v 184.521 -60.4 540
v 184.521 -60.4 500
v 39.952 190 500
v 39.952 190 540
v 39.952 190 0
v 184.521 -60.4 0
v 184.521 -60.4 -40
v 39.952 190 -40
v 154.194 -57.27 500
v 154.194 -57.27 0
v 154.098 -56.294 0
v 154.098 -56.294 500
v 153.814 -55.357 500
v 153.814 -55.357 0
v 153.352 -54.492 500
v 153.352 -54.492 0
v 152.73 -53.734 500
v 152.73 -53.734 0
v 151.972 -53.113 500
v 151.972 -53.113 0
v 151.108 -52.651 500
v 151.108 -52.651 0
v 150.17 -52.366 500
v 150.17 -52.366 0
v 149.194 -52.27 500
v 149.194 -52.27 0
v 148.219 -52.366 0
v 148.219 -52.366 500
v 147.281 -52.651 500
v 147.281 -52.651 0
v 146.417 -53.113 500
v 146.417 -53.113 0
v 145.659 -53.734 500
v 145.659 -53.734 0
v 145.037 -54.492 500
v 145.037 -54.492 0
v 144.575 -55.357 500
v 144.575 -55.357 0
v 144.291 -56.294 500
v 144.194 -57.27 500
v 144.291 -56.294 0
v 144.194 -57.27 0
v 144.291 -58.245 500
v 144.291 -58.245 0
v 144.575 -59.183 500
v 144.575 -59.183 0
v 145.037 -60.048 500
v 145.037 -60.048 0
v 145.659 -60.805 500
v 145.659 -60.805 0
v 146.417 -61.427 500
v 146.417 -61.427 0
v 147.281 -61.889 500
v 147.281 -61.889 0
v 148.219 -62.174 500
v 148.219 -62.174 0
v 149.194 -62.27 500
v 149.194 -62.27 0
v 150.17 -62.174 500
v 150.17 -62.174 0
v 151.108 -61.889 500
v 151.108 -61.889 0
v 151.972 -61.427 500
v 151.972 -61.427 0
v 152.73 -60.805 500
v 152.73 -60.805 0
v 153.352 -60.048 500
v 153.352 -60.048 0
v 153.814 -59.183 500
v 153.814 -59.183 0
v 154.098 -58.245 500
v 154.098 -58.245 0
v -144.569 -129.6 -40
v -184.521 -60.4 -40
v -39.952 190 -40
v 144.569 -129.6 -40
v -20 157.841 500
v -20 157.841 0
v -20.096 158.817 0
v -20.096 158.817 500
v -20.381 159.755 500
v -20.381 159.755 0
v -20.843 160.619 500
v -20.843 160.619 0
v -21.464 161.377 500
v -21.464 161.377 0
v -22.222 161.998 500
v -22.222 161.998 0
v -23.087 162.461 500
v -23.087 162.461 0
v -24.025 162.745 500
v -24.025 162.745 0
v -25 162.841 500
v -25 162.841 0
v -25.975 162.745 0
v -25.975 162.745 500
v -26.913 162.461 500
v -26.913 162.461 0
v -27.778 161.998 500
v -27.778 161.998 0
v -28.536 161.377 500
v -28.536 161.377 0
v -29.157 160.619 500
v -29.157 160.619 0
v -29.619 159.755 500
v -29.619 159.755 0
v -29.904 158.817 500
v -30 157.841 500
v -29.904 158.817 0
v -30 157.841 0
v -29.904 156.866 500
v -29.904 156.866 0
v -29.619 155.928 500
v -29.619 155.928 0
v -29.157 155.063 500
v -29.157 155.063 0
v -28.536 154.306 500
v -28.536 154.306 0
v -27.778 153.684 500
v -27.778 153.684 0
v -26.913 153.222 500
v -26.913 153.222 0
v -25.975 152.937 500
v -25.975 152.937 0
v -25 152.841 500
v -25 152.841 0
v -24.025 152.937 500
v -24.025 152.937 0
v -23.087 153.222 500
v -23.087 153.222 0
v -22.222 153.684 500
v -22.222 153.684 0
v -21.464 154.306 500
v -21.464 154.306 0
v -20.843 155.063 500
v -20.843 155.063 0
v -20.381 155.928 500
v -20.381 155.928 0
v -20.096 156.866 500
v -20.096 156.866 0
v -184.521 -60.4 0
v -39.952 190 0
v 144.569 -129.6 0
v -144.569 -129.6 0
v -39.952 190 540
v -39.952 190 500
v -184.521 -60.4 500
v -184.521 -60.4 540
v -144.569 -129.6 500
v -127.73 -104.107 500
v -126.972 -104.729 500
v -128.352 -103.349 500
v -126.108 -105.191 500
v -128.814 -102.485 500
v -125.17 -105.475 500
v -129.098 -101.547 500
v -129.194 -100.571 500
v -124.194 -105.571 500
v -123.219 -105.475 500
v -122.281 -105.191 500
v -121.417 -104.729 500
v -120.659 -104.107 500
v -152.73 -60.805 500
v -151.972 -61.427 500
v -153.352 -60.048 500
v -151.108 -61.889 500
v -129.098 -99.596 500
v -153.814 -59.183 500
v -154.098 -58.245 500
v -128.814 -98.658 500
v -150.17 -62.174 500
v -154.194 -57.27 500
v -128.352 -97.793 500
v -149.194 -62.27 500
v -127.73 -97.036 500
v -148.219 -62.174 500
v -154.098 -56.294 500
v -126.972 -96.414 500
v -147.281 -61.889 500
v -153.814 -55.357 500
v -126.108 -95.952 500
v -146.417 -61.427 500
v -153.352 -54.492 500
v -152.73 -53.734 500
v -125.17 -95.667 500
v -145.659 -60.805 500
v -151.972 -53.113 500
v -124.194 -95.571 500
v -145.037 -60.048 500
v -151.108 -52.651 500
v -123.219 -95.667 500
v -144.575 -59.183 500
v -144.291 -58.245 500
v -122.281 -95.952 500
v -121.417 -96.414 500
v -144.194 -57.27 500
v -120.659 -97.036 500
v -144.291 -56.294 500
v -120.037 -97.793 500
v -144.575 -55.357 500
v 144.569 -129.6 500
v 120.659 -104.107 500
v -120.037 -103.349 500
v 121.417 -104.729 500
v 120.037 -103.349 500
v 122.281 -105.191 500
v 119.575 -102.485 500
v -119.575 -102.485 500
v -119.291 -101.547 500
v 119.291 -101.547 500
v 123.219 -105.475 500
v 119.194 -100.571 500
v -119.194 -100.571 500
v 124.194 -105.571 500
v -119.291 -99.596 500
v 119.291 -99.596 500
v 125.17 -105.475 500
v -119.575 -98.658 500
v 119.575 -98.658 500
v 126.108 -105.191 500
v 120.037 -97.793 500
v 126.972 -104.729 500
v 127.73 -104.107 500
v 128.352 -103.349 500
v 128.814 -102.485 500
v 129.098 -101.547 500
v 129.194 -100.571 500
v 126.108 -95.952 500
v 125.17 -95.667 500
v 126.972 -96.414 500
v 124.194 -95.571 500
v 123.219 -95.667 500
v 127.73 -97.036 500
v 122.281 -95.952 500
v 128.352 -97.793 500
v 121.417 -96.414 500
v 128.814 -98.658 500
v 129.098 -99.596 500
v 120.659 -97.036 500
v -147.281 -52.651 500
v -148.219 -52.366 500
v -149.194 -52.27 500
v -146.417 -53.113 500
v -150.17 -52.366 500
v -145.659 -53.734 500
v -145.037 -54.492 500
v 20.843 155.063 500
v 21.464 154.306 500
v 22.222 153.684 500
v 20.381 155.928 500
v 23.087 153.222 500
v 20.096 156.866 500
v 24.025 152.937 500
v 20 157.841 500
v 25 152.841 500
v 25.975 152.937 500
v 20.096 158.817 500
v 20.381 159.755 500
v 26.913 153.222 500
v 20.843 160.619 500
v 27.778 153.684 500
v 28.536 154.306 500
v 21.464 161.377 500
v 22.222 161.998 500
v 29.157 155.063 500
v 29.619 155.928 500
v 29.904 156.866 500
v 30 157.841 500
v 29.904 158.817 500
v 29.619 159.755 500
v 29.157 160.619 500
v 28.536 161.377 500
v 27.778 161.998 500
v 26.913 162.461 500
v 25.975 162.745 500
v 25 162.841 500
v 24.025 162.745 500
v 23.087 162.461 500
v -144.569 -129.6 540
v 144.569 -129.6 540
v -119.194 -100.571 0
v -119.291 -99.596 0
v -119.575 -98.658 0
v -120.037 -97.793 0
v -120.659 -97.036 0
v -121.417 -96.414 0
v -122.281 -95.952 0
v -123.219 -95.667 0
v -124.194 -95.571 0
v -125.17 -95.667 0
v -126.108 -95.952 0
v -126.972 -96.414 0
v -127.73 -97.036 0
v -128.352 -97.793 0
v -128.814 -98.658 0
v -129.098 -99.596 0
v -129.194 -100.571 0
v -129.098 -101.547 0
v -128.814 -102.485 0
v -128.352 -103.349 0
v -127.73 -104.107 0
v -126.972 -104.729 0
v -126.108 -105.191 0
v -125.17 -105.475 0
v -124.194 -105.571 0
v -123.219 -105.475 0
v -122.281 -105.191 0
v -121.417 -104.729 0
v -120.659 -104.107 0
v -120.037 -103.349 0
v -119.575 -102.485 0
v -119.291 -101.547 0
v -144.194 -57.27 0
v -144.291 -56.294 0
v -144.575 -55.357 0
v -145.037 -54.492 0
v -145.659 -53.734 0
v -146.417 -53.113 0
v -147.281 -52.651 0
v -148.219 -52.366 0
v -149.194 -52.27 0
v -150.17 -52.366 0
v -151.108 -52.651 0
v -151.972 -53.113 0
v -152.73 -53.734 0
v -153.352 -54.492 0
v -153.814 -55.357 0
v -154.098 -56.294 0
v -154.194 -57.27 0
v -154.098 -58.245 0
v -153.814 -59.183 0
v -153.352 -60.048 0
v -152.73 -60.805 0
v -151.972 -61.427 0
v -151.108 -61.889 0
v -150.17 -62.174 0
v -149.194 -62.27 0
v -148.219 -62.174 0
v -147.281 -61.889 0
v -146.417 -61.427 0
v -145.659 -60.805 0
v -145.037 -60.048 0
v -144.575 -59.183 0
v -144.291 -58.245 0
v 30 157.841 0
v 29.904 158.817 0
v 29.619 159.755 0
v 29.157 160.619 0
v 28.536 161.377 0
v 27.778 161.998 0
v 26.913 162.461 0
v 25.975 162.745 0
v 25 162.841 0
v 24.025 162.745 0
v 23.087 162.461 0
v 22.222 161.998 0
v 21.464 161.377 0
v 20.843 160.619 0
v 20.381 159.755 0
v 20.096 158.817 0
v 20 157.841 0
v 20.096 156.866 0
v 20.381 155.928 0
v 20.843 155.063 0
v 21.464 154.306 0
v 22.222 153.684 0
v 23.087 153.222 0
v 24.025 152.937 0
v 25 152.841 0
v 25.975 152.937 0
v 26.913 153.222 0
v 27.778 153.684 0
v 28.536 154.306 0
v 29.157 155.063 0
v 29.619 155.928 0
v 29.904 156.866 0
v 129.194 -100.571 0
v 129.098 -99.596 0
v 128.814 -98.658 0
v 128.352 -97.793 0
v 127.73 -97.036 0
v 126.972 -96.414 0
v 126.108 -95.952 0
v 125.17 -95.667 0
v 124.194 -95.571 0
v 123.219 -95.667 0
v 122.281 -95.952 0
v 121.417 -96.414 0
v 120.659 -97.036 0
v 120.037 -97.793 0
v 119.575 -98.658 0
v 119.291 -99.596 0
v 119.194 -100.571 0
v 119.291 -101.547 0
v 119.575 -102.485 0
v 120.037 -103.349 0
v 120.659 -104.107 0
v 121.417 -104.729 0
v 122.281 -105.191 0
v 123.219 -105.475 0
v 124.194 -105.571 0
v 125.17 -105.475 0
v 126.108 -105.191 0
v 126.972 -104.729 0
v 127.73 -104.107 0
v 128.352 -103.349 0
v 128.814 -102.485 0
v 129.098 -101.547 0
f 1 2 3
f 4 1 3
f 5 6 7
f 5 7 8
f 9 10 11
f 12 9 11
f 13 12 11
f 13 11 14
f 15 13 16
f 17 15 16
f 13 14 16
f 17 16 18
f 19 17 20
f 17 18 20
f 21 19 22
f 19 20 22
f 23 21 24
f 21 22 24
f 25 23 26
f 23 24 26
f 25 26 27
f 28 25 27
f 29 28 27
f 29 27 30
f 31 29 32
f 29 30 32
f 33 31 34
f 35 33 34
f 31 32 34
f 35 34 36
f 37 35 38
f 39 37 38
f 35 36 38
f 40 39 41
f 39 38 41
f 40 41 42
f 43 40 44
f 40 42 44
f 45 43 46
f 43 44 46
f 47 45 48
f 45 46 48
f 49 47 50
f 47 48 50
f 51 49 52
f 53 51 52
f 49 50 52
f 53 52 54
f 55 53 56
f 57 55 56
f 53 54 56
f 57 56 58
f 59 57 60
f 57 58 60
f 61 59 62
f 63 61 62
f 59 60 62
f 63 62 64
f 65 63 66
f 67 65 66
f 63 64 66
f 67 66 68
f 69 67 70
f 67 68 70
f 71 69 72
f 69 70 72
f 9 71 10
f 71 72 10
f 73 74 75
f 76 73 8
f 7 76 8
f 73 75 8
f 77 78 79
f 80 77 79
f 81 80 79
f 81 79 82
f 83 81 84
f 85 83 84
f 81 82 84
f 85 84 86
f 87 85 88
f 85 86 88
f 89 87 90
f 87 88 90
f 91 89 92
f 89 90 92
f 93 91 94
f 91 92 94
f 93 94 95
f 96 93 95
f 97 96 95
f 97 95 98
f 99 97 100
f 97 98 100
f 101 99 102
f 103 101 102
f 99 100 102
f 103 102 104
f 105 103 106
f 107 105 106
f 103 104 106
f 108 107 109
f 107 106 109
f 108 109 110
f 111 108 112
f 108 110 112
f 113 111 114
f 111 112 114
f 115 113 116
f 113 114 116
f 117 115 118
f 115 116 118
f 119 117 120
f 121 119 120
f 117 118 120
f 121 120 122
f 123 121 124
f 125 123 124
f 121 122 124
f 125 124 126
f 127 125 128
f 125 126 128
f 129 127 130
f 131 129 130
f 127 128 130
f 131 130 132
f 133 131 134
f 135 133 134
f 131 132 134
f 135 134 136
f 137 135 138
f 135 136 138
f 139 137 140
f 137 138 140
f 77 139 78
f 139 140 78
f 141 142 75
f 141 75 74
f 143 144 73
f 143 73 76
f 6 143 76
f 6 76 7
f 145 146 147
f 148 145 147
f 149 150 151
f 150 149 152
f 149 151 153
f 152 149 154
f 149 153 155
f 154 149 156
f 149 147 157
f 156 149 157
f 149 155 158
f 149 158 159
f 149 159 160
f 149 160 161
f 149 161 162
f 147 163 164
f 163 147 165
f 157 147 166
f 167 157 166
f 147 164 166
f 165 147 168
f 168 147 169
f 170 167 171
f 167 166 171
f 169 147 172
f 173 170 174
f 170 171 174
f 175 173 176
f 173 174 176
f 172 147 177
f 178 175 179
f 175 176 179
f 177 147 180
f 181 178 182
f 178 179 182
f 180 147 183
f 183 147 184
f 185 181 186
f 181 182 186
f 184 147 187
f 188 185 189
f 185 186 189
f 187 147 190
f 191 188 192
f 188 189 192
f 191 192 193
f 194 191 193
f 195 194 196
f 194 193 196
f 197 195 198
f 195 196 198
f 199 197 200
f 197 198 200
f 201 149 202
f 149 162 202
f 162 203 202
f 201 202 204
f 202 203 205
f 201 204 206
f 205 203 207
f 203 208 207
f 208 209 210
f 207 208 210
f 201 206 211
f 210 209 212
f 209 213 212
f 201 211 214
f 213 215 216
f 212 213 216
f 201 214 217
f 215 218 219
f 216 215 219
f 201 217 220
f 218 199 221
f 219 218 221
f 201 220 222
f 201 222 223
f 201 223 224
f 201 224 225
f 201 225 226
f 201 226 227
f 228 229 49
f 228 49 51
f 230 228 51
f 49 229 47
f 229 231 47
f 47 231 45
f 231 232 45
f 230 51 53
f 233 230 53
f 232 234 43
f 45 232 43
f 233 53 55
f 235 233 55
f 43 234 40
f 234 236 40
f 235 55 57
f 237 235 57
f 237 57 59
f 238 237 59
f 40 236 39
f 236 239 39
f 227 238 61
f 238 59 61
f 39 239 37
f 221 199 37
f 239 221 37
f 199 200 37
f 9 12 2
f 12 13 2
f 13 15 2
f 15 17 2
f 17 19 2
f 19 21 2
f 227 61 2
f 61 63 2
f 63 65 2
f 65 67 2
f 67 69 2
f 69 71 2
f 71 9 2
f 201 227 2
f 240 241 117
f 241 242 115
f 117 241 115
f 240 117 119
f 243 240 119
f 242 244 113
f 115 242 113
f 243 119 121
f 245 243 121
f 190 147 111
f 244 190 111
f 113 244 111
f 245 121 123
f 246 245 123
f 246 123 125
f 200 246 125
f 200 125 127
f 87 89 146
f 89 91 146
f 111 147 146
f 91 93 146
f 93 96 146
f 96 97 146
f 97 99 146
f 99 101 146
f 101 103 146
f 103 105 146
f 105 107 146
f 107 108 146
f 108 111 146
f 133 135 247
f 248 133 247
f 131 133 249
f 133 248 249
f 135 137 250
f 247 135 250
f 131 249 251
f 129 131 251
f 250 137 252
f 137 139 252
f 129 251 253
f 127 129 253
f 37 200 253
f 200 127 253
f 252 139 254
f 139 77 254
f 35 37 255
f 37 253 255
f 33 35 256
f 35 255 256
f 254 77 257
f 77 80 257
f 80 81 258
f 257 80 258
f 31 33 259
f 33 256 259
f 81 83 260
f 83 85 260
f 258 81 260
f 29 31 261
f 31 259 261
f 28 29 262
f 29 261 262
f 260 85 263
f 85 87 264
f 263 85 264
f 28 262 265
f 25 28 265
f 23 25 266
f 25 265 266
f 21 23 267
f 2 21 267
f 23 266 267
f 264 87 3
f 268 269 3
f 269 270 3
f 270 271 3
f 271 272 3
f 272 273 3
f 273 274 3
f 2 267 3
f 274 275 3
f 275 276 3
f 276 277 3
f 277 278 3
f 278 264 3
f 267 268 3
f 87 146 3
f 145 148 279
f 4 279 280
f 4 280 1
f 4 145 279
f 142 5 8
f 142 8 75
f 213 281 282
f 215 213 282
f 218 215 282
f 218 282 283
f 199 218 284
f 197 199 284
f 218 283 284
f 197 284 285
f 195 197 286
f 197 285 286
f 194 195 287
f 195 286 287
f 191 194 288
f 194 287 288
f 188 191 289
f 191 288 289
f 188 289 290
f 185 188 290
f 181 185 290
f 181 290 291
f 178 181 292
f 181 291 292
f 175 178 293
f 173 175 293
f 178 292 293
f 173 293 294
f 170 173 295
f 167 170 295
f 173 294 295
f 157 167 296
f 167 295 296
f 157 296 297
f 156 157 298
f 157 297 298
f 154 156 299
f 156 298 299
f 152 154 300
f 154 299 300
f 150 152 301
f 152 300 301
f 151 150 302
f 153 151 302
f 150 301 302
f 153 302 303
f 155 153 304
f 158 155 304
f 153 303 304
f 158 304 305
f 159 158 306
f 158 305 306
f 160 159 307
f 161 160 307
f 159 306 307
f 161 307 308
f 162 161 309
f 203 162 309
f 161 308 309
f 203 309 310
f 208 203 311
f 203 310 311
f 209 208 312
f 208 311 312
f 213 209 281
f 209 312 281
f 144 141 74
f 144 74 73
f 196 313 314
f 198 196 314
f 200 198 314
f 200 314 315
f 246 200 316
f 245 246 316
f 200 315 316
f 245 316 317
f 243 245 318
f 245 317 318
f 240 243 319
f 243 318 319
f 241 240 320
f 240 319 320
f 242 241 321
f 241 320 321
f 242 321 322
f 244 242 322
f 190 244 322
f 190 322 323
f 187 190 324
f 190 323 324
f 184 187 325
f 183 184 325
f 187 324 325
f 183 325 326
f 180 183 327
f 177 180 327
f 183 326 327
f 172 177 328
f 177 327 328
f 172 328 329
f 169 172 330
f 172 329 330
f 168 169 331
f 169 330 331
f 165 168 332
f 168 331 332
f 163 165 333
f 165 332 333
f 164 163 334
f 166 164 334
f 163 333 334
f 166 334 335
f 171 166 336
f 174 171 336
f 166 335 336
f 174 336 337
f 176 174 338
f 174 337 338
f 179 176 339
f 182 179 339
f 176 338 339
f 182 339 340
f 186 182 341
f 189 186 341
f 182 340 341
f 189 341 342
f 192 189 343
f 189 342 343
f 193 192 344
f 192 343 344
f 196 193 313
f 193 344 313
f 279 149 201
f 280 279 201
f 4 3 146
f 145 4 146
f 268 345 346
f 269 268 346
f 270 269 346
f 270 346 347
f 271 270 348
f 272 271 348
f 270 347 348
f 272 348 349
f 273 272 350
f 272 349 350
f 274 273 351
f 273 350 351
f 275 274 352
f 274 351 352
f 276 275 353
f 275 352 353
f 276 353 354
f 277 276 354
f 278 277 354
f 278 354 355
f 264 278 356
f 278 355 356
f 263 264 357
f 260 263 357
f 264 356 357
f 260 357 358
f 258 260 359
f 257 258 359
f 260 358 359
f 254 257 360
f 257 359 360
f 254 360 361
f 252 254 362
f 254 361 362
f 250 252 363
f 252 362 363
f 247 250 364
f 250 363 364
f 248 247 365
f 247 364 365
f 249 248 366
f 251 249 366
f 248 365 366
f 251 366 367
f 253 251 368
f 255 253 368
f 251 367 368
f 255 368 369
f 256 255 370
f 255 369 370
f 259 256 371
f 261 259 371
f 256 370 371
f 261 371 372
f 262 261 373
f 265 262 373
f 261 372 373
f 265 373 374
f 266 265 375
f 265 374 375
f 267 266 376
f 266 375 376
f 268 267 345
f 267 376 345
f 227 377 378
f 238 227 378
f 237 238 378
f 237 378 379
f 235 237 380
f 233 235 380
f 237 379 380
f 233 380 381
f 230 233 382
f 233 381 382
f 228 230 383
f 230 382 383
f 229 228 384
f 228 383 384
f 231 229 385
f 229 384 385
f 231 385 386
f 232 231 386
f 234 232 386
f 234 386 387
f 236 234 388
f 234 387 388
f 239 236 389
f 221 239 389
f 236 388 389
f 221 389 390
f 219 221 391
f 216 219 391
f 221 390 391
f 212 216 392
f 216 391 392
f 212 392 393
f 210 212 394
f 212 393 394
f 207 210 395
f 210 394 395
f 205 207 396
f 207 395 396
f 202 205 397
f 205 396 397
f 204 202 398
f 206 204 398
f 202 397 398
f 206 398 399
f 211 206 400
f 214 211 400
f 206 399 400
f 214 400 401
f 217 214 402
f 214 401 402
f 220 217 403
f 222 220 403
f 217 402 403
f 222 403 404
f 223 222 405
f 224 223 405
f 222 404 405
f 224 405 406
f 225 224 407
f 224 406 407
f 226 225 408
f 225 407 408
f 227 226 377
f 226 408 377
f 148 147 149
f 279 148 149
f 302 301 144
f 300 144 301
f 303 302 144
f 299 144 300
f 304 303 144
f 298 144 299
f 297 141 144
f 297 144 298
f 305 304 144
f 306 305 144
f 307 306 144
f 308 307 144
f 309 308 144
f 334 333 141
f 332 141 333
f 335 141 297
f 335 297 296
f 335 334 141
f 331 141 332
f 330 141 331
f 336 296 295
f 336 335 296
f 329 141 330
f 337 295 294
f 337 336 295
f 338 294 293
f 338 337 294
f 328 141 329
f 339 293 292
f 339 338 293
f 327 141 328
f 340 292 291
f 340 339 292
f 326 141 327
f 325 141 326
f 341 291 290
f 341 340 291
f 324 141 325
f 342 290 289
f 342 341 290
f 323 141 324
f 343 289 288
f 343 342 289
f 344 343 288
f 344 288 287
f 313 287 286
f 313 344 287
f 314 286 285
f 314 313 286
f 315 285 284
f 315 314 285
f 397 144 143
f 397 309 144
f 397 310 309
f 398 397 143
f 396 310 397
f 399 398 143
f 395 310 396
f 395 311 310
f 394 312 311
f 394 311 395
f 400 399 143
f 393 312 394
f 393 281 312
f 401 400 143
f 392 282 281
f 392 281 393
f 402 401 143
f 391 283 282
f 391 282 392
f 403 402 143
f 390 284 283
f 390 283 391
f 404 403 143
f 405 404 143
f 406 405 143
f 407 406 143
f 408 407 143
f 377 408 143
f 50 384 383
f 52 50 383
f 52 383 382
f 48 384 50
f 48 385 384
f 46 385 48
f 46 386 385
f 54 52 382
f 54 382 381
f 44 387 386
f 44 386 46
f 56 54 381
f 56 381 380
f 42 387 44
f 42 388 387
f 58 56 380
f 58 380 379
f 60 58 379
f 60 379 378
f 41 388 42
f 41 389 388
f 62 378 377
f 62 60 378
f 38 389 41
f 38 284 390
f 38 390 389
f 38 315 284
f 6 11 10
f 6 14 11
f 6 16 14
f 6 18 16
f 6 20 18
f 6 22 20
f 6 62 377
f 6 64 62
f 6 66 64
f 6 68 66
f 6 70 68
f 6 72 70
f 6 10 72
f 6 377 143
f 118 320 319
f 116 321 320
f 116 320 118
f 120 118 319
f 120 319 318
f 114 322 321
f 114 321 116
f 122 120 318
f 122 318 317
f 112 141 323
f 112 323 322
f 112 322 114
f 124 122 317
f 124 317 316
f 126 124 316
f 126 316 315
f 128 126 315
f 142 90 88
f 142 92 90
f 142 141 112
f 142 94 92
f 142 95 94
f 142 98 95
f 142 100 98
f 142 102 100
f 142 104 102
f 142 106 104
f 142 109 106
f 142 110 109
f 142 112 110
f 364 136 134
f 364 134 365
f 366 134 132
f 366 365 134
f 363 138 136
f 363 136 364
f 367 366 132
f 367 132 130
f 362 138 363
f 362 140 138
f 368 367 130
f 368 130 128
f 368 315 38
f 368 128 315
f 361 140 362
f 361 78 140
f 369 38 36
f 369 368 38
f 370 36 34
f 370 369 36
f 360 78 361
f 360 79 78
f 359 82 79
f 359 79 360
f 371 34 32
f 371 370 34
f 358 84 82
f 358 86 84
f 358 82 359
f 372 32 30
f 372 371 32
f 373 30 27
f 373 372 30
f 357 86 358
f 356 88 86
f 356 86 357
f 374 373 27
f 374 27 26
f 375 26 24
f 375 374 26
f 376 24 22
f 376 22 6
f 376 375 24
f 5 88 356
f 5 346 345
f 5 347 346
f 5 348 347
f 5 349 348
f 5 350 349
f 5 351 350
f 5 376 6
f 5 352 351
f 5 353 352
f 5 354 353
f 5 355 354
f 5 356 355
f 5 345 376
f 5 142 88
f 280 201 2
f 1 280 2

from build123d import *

# Parameters (mm, degrees)
BOSS_EXTRUDE1_DEPTH = 40
SKETCH2_R           = 5
BOSS_EXTRUDE2_DEPTH = 500


with BuildPart() as part:
    # Sketch1 → Boss-Extrude1 (new body)
    with BuildSketch(Plane.XY):
        Polygon((184.521008641, -60.40023797), (39.952363844, 190), (-39.952363844, 190), (-184.521008641, -60.40023797), (-144.568644797, -129.59976203), (144.568644797, -129.59976203), align=None)
    boss_extrude1 = extrude(amount=-BOSS_EXTRUDE1_DEPTH)

    # Sketch2 → Boss-Extrude2 (add)
    with BuildSketch(Plane.XY):
        with Locations((25, 157.841136245)):
            Circle(SKETCH2_R)
        with Locations((-25, 157.841136245)):
            Circle(SKETCH2_R)
        with Locations((124.19443375, -100.571203217)):
            Circle(SKETCH2_R)
        with Locations((149.19443375, -57.269933028)):
            Circle(SKETCH2_R)
        with Locations((-149.19443375, -57.269933028)):
            Circle(SKETCH2_R)
        with Locations((-124.19443375, -100.571203217)):
            Circle(SKETCH2_R)
    extrude(amount=BOSS_EXTRUDE2_DEPTH)

    # Mirror1: Boss-Extrude1 across plane
    add(boss_extrude1.mirror(Plane.XY.offset(250)))


solid = part.part
